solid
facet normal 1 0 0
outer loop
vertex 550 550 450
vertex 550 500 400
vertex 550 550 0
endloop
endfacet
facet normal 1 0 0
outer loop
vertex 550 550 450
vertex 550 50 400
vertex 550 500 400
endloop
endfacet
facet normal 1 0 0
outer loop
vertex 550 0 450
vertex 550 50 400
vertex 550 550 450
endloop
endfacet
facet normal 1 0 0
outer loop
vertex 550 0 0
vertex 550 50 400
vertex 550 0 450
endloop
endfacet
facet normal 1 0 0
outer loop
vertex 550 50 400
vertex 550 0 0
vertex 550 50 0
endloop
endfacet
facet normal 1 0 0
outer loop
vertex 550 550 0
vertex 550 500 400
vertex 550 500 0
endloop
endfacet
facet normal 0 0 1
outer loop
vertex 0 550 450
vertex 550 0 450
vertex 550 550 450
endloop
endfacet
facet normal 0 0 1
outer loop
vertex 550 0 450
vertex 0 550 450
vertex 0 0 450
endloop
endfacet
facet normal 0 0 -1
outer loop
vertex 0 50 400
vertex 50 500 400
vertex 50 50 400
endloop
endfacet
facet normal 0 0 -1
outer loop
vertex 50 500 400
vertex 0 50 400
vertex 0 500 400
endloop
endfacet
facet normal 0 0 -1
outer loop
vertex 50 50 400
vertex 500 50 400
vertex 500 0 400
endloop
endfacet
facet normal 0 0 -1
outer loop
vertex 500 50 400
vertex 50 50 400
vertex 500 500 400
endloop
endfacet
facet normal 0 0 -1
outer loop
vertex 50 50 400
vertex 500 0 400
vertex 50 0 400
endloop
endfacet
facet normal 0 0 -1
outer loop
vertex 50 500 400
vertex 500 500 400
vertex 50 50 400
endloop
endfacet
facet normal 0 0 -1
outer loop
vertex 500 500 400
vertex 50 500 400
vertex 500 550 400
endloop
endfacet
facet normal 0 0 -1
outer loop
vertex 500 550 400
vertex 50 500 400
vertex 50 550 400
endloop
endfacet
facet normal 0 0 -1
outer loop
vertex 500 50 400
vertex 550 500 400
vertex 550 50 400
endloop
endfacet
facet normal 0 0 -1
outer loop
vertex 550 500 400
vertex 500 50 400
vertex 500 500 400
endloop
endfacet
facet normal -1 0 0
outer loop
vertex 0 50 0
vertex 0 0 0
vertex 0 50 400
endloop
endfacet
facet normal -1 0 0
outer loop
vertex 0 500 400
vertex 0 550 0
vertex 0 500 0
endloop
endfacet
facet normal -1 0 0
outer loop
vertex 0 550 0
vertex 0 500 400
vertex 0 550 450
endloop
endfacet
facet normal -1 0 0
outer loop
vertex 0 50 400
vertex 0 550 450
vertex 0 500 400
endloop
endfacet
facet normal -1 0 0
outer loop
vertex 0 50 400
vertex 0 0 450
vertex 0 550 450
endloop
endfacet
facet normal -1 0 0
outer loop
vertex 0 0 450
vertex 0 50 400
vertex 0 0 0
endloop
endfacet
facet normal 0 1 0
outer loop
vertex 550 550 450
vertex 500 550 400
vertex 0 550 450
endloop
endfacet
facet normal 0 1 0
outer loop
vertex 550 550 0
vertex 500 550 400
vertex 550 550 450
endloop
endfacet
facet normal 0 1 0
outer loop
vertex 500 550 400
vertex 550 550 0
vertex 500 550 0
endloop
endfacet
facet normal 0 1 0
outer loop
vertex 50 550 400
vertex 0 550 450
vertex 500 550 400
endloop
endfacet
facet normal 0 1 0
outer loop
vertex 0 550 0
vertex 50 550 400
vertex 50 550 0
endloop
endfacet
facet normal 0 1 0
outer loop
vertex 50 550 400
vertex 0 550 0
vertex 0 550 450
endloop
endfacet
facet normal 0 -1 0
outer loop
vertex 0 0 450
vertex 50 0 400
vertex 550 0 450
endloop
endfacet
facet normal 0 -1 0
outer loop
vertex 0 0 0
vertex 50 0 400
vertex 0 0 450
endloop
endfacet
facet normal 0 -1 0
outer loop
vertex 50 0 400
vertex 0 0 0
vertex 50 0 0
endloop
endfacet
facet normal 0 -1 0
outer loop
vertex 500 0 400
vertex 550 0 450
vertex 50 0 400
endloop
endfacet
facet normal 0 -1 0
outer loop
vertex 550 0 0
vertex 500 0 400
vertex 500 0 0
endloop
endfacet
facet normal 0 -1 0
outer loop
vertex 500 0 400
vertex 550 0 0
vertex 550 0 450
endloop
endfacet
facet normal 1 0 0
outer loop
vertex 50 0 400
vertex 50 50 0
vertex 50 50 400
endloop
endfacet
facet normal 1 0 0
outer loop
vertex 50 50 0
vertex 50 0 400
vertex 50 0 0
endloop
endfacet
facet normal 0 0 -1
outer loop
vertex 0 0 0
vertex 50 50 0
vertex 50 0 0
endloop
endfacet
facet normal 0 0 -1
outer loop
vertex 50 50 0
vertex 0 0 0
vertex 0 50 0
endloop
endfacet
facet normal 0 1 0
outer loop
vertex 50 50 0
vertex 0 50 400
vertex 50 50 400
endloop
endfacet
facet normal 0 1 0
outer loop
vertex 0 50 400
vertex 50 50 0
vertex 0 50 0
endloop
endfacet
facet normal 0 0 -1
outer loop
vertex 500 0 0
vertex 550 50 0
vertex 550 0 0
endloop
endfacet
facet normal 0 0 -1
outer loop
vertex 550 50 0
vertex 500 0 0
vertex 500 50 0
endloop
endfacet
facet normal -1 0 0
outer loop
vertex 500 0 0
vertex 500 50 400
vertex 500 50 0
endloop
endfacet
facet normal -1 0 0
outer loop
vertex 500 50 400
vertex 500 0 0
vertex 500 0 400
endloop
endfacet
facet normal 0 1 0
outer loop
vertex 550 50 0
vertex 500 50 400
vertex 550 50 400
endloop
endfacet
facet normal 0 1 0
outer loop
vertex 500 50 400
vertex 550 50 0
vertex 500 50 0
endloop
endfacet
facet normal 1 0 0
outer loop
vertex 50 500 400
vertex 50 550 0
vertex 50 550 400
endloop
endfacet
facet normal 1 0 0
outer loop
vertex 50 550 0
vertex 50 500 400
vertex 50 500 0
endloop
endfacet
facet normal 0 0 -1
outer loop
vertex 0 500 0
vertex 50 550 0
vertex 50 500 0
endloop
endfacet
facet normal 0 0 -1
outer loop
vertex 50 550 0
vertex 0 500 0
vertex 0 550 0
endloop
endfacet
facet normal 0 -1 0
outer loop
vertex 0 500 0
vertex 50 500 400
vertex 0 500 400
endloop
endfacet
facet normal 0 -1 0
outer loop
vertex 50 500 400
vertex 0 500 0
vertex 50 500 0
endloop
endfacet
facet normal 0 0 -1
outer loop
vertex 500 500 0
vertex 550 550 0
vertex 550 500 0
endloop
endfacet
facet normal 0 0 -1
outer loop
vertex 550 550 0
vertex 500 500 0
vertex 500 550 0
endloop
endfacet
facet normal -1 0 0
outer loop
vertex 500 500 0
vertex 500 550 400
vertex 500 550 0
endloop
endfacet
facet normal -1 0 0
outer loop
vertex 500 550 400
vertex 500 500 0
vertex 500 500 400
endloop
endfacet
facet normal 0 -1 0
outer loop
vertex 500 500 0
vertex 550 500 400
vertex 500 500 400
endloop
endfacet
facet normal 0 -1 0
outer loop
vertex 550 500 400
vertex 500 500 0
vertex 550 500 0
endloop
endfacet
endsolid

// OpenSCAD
tabletopWidth = 50;
tableTopEdgeLength = 550;
tableHeight = 450;

tableBaseEdgeLength=50;
tableBaseHeight = tableHeight - tabletopWidth;

// Distance from origin to a table base
tableBaseDistance = tableTopEdgeLength-tableBaseEdgeLength;

module ikea_lack_table() {
  // Table top
  translate([0, 0, tableBaseHeight]) cube([tableTopEdgeLength, tableTopEdgeLength, tabletopWidth]);

  // Table base
  cube([tableBaseEdgeLength, tableBaseEdgeLength, tableBaseHeight]);
  translate([tableBaseDistance, 0]) cube([tableBaseEdgeLength, tableBaseEdgeLength, tableBaseHeight]);
  translate([0, tableBaseDistance]) cube([tableBaseEdgeLength, tableBaseEdgeLength, tableBaseHeight]);
  translate([tableBaseDistance, tableBaseDistance]) cube([tableBaseEdgeLength, tableBaseEdgeLength, tableBaseHeight]);
}

color("grey") ikea_lack_table();
